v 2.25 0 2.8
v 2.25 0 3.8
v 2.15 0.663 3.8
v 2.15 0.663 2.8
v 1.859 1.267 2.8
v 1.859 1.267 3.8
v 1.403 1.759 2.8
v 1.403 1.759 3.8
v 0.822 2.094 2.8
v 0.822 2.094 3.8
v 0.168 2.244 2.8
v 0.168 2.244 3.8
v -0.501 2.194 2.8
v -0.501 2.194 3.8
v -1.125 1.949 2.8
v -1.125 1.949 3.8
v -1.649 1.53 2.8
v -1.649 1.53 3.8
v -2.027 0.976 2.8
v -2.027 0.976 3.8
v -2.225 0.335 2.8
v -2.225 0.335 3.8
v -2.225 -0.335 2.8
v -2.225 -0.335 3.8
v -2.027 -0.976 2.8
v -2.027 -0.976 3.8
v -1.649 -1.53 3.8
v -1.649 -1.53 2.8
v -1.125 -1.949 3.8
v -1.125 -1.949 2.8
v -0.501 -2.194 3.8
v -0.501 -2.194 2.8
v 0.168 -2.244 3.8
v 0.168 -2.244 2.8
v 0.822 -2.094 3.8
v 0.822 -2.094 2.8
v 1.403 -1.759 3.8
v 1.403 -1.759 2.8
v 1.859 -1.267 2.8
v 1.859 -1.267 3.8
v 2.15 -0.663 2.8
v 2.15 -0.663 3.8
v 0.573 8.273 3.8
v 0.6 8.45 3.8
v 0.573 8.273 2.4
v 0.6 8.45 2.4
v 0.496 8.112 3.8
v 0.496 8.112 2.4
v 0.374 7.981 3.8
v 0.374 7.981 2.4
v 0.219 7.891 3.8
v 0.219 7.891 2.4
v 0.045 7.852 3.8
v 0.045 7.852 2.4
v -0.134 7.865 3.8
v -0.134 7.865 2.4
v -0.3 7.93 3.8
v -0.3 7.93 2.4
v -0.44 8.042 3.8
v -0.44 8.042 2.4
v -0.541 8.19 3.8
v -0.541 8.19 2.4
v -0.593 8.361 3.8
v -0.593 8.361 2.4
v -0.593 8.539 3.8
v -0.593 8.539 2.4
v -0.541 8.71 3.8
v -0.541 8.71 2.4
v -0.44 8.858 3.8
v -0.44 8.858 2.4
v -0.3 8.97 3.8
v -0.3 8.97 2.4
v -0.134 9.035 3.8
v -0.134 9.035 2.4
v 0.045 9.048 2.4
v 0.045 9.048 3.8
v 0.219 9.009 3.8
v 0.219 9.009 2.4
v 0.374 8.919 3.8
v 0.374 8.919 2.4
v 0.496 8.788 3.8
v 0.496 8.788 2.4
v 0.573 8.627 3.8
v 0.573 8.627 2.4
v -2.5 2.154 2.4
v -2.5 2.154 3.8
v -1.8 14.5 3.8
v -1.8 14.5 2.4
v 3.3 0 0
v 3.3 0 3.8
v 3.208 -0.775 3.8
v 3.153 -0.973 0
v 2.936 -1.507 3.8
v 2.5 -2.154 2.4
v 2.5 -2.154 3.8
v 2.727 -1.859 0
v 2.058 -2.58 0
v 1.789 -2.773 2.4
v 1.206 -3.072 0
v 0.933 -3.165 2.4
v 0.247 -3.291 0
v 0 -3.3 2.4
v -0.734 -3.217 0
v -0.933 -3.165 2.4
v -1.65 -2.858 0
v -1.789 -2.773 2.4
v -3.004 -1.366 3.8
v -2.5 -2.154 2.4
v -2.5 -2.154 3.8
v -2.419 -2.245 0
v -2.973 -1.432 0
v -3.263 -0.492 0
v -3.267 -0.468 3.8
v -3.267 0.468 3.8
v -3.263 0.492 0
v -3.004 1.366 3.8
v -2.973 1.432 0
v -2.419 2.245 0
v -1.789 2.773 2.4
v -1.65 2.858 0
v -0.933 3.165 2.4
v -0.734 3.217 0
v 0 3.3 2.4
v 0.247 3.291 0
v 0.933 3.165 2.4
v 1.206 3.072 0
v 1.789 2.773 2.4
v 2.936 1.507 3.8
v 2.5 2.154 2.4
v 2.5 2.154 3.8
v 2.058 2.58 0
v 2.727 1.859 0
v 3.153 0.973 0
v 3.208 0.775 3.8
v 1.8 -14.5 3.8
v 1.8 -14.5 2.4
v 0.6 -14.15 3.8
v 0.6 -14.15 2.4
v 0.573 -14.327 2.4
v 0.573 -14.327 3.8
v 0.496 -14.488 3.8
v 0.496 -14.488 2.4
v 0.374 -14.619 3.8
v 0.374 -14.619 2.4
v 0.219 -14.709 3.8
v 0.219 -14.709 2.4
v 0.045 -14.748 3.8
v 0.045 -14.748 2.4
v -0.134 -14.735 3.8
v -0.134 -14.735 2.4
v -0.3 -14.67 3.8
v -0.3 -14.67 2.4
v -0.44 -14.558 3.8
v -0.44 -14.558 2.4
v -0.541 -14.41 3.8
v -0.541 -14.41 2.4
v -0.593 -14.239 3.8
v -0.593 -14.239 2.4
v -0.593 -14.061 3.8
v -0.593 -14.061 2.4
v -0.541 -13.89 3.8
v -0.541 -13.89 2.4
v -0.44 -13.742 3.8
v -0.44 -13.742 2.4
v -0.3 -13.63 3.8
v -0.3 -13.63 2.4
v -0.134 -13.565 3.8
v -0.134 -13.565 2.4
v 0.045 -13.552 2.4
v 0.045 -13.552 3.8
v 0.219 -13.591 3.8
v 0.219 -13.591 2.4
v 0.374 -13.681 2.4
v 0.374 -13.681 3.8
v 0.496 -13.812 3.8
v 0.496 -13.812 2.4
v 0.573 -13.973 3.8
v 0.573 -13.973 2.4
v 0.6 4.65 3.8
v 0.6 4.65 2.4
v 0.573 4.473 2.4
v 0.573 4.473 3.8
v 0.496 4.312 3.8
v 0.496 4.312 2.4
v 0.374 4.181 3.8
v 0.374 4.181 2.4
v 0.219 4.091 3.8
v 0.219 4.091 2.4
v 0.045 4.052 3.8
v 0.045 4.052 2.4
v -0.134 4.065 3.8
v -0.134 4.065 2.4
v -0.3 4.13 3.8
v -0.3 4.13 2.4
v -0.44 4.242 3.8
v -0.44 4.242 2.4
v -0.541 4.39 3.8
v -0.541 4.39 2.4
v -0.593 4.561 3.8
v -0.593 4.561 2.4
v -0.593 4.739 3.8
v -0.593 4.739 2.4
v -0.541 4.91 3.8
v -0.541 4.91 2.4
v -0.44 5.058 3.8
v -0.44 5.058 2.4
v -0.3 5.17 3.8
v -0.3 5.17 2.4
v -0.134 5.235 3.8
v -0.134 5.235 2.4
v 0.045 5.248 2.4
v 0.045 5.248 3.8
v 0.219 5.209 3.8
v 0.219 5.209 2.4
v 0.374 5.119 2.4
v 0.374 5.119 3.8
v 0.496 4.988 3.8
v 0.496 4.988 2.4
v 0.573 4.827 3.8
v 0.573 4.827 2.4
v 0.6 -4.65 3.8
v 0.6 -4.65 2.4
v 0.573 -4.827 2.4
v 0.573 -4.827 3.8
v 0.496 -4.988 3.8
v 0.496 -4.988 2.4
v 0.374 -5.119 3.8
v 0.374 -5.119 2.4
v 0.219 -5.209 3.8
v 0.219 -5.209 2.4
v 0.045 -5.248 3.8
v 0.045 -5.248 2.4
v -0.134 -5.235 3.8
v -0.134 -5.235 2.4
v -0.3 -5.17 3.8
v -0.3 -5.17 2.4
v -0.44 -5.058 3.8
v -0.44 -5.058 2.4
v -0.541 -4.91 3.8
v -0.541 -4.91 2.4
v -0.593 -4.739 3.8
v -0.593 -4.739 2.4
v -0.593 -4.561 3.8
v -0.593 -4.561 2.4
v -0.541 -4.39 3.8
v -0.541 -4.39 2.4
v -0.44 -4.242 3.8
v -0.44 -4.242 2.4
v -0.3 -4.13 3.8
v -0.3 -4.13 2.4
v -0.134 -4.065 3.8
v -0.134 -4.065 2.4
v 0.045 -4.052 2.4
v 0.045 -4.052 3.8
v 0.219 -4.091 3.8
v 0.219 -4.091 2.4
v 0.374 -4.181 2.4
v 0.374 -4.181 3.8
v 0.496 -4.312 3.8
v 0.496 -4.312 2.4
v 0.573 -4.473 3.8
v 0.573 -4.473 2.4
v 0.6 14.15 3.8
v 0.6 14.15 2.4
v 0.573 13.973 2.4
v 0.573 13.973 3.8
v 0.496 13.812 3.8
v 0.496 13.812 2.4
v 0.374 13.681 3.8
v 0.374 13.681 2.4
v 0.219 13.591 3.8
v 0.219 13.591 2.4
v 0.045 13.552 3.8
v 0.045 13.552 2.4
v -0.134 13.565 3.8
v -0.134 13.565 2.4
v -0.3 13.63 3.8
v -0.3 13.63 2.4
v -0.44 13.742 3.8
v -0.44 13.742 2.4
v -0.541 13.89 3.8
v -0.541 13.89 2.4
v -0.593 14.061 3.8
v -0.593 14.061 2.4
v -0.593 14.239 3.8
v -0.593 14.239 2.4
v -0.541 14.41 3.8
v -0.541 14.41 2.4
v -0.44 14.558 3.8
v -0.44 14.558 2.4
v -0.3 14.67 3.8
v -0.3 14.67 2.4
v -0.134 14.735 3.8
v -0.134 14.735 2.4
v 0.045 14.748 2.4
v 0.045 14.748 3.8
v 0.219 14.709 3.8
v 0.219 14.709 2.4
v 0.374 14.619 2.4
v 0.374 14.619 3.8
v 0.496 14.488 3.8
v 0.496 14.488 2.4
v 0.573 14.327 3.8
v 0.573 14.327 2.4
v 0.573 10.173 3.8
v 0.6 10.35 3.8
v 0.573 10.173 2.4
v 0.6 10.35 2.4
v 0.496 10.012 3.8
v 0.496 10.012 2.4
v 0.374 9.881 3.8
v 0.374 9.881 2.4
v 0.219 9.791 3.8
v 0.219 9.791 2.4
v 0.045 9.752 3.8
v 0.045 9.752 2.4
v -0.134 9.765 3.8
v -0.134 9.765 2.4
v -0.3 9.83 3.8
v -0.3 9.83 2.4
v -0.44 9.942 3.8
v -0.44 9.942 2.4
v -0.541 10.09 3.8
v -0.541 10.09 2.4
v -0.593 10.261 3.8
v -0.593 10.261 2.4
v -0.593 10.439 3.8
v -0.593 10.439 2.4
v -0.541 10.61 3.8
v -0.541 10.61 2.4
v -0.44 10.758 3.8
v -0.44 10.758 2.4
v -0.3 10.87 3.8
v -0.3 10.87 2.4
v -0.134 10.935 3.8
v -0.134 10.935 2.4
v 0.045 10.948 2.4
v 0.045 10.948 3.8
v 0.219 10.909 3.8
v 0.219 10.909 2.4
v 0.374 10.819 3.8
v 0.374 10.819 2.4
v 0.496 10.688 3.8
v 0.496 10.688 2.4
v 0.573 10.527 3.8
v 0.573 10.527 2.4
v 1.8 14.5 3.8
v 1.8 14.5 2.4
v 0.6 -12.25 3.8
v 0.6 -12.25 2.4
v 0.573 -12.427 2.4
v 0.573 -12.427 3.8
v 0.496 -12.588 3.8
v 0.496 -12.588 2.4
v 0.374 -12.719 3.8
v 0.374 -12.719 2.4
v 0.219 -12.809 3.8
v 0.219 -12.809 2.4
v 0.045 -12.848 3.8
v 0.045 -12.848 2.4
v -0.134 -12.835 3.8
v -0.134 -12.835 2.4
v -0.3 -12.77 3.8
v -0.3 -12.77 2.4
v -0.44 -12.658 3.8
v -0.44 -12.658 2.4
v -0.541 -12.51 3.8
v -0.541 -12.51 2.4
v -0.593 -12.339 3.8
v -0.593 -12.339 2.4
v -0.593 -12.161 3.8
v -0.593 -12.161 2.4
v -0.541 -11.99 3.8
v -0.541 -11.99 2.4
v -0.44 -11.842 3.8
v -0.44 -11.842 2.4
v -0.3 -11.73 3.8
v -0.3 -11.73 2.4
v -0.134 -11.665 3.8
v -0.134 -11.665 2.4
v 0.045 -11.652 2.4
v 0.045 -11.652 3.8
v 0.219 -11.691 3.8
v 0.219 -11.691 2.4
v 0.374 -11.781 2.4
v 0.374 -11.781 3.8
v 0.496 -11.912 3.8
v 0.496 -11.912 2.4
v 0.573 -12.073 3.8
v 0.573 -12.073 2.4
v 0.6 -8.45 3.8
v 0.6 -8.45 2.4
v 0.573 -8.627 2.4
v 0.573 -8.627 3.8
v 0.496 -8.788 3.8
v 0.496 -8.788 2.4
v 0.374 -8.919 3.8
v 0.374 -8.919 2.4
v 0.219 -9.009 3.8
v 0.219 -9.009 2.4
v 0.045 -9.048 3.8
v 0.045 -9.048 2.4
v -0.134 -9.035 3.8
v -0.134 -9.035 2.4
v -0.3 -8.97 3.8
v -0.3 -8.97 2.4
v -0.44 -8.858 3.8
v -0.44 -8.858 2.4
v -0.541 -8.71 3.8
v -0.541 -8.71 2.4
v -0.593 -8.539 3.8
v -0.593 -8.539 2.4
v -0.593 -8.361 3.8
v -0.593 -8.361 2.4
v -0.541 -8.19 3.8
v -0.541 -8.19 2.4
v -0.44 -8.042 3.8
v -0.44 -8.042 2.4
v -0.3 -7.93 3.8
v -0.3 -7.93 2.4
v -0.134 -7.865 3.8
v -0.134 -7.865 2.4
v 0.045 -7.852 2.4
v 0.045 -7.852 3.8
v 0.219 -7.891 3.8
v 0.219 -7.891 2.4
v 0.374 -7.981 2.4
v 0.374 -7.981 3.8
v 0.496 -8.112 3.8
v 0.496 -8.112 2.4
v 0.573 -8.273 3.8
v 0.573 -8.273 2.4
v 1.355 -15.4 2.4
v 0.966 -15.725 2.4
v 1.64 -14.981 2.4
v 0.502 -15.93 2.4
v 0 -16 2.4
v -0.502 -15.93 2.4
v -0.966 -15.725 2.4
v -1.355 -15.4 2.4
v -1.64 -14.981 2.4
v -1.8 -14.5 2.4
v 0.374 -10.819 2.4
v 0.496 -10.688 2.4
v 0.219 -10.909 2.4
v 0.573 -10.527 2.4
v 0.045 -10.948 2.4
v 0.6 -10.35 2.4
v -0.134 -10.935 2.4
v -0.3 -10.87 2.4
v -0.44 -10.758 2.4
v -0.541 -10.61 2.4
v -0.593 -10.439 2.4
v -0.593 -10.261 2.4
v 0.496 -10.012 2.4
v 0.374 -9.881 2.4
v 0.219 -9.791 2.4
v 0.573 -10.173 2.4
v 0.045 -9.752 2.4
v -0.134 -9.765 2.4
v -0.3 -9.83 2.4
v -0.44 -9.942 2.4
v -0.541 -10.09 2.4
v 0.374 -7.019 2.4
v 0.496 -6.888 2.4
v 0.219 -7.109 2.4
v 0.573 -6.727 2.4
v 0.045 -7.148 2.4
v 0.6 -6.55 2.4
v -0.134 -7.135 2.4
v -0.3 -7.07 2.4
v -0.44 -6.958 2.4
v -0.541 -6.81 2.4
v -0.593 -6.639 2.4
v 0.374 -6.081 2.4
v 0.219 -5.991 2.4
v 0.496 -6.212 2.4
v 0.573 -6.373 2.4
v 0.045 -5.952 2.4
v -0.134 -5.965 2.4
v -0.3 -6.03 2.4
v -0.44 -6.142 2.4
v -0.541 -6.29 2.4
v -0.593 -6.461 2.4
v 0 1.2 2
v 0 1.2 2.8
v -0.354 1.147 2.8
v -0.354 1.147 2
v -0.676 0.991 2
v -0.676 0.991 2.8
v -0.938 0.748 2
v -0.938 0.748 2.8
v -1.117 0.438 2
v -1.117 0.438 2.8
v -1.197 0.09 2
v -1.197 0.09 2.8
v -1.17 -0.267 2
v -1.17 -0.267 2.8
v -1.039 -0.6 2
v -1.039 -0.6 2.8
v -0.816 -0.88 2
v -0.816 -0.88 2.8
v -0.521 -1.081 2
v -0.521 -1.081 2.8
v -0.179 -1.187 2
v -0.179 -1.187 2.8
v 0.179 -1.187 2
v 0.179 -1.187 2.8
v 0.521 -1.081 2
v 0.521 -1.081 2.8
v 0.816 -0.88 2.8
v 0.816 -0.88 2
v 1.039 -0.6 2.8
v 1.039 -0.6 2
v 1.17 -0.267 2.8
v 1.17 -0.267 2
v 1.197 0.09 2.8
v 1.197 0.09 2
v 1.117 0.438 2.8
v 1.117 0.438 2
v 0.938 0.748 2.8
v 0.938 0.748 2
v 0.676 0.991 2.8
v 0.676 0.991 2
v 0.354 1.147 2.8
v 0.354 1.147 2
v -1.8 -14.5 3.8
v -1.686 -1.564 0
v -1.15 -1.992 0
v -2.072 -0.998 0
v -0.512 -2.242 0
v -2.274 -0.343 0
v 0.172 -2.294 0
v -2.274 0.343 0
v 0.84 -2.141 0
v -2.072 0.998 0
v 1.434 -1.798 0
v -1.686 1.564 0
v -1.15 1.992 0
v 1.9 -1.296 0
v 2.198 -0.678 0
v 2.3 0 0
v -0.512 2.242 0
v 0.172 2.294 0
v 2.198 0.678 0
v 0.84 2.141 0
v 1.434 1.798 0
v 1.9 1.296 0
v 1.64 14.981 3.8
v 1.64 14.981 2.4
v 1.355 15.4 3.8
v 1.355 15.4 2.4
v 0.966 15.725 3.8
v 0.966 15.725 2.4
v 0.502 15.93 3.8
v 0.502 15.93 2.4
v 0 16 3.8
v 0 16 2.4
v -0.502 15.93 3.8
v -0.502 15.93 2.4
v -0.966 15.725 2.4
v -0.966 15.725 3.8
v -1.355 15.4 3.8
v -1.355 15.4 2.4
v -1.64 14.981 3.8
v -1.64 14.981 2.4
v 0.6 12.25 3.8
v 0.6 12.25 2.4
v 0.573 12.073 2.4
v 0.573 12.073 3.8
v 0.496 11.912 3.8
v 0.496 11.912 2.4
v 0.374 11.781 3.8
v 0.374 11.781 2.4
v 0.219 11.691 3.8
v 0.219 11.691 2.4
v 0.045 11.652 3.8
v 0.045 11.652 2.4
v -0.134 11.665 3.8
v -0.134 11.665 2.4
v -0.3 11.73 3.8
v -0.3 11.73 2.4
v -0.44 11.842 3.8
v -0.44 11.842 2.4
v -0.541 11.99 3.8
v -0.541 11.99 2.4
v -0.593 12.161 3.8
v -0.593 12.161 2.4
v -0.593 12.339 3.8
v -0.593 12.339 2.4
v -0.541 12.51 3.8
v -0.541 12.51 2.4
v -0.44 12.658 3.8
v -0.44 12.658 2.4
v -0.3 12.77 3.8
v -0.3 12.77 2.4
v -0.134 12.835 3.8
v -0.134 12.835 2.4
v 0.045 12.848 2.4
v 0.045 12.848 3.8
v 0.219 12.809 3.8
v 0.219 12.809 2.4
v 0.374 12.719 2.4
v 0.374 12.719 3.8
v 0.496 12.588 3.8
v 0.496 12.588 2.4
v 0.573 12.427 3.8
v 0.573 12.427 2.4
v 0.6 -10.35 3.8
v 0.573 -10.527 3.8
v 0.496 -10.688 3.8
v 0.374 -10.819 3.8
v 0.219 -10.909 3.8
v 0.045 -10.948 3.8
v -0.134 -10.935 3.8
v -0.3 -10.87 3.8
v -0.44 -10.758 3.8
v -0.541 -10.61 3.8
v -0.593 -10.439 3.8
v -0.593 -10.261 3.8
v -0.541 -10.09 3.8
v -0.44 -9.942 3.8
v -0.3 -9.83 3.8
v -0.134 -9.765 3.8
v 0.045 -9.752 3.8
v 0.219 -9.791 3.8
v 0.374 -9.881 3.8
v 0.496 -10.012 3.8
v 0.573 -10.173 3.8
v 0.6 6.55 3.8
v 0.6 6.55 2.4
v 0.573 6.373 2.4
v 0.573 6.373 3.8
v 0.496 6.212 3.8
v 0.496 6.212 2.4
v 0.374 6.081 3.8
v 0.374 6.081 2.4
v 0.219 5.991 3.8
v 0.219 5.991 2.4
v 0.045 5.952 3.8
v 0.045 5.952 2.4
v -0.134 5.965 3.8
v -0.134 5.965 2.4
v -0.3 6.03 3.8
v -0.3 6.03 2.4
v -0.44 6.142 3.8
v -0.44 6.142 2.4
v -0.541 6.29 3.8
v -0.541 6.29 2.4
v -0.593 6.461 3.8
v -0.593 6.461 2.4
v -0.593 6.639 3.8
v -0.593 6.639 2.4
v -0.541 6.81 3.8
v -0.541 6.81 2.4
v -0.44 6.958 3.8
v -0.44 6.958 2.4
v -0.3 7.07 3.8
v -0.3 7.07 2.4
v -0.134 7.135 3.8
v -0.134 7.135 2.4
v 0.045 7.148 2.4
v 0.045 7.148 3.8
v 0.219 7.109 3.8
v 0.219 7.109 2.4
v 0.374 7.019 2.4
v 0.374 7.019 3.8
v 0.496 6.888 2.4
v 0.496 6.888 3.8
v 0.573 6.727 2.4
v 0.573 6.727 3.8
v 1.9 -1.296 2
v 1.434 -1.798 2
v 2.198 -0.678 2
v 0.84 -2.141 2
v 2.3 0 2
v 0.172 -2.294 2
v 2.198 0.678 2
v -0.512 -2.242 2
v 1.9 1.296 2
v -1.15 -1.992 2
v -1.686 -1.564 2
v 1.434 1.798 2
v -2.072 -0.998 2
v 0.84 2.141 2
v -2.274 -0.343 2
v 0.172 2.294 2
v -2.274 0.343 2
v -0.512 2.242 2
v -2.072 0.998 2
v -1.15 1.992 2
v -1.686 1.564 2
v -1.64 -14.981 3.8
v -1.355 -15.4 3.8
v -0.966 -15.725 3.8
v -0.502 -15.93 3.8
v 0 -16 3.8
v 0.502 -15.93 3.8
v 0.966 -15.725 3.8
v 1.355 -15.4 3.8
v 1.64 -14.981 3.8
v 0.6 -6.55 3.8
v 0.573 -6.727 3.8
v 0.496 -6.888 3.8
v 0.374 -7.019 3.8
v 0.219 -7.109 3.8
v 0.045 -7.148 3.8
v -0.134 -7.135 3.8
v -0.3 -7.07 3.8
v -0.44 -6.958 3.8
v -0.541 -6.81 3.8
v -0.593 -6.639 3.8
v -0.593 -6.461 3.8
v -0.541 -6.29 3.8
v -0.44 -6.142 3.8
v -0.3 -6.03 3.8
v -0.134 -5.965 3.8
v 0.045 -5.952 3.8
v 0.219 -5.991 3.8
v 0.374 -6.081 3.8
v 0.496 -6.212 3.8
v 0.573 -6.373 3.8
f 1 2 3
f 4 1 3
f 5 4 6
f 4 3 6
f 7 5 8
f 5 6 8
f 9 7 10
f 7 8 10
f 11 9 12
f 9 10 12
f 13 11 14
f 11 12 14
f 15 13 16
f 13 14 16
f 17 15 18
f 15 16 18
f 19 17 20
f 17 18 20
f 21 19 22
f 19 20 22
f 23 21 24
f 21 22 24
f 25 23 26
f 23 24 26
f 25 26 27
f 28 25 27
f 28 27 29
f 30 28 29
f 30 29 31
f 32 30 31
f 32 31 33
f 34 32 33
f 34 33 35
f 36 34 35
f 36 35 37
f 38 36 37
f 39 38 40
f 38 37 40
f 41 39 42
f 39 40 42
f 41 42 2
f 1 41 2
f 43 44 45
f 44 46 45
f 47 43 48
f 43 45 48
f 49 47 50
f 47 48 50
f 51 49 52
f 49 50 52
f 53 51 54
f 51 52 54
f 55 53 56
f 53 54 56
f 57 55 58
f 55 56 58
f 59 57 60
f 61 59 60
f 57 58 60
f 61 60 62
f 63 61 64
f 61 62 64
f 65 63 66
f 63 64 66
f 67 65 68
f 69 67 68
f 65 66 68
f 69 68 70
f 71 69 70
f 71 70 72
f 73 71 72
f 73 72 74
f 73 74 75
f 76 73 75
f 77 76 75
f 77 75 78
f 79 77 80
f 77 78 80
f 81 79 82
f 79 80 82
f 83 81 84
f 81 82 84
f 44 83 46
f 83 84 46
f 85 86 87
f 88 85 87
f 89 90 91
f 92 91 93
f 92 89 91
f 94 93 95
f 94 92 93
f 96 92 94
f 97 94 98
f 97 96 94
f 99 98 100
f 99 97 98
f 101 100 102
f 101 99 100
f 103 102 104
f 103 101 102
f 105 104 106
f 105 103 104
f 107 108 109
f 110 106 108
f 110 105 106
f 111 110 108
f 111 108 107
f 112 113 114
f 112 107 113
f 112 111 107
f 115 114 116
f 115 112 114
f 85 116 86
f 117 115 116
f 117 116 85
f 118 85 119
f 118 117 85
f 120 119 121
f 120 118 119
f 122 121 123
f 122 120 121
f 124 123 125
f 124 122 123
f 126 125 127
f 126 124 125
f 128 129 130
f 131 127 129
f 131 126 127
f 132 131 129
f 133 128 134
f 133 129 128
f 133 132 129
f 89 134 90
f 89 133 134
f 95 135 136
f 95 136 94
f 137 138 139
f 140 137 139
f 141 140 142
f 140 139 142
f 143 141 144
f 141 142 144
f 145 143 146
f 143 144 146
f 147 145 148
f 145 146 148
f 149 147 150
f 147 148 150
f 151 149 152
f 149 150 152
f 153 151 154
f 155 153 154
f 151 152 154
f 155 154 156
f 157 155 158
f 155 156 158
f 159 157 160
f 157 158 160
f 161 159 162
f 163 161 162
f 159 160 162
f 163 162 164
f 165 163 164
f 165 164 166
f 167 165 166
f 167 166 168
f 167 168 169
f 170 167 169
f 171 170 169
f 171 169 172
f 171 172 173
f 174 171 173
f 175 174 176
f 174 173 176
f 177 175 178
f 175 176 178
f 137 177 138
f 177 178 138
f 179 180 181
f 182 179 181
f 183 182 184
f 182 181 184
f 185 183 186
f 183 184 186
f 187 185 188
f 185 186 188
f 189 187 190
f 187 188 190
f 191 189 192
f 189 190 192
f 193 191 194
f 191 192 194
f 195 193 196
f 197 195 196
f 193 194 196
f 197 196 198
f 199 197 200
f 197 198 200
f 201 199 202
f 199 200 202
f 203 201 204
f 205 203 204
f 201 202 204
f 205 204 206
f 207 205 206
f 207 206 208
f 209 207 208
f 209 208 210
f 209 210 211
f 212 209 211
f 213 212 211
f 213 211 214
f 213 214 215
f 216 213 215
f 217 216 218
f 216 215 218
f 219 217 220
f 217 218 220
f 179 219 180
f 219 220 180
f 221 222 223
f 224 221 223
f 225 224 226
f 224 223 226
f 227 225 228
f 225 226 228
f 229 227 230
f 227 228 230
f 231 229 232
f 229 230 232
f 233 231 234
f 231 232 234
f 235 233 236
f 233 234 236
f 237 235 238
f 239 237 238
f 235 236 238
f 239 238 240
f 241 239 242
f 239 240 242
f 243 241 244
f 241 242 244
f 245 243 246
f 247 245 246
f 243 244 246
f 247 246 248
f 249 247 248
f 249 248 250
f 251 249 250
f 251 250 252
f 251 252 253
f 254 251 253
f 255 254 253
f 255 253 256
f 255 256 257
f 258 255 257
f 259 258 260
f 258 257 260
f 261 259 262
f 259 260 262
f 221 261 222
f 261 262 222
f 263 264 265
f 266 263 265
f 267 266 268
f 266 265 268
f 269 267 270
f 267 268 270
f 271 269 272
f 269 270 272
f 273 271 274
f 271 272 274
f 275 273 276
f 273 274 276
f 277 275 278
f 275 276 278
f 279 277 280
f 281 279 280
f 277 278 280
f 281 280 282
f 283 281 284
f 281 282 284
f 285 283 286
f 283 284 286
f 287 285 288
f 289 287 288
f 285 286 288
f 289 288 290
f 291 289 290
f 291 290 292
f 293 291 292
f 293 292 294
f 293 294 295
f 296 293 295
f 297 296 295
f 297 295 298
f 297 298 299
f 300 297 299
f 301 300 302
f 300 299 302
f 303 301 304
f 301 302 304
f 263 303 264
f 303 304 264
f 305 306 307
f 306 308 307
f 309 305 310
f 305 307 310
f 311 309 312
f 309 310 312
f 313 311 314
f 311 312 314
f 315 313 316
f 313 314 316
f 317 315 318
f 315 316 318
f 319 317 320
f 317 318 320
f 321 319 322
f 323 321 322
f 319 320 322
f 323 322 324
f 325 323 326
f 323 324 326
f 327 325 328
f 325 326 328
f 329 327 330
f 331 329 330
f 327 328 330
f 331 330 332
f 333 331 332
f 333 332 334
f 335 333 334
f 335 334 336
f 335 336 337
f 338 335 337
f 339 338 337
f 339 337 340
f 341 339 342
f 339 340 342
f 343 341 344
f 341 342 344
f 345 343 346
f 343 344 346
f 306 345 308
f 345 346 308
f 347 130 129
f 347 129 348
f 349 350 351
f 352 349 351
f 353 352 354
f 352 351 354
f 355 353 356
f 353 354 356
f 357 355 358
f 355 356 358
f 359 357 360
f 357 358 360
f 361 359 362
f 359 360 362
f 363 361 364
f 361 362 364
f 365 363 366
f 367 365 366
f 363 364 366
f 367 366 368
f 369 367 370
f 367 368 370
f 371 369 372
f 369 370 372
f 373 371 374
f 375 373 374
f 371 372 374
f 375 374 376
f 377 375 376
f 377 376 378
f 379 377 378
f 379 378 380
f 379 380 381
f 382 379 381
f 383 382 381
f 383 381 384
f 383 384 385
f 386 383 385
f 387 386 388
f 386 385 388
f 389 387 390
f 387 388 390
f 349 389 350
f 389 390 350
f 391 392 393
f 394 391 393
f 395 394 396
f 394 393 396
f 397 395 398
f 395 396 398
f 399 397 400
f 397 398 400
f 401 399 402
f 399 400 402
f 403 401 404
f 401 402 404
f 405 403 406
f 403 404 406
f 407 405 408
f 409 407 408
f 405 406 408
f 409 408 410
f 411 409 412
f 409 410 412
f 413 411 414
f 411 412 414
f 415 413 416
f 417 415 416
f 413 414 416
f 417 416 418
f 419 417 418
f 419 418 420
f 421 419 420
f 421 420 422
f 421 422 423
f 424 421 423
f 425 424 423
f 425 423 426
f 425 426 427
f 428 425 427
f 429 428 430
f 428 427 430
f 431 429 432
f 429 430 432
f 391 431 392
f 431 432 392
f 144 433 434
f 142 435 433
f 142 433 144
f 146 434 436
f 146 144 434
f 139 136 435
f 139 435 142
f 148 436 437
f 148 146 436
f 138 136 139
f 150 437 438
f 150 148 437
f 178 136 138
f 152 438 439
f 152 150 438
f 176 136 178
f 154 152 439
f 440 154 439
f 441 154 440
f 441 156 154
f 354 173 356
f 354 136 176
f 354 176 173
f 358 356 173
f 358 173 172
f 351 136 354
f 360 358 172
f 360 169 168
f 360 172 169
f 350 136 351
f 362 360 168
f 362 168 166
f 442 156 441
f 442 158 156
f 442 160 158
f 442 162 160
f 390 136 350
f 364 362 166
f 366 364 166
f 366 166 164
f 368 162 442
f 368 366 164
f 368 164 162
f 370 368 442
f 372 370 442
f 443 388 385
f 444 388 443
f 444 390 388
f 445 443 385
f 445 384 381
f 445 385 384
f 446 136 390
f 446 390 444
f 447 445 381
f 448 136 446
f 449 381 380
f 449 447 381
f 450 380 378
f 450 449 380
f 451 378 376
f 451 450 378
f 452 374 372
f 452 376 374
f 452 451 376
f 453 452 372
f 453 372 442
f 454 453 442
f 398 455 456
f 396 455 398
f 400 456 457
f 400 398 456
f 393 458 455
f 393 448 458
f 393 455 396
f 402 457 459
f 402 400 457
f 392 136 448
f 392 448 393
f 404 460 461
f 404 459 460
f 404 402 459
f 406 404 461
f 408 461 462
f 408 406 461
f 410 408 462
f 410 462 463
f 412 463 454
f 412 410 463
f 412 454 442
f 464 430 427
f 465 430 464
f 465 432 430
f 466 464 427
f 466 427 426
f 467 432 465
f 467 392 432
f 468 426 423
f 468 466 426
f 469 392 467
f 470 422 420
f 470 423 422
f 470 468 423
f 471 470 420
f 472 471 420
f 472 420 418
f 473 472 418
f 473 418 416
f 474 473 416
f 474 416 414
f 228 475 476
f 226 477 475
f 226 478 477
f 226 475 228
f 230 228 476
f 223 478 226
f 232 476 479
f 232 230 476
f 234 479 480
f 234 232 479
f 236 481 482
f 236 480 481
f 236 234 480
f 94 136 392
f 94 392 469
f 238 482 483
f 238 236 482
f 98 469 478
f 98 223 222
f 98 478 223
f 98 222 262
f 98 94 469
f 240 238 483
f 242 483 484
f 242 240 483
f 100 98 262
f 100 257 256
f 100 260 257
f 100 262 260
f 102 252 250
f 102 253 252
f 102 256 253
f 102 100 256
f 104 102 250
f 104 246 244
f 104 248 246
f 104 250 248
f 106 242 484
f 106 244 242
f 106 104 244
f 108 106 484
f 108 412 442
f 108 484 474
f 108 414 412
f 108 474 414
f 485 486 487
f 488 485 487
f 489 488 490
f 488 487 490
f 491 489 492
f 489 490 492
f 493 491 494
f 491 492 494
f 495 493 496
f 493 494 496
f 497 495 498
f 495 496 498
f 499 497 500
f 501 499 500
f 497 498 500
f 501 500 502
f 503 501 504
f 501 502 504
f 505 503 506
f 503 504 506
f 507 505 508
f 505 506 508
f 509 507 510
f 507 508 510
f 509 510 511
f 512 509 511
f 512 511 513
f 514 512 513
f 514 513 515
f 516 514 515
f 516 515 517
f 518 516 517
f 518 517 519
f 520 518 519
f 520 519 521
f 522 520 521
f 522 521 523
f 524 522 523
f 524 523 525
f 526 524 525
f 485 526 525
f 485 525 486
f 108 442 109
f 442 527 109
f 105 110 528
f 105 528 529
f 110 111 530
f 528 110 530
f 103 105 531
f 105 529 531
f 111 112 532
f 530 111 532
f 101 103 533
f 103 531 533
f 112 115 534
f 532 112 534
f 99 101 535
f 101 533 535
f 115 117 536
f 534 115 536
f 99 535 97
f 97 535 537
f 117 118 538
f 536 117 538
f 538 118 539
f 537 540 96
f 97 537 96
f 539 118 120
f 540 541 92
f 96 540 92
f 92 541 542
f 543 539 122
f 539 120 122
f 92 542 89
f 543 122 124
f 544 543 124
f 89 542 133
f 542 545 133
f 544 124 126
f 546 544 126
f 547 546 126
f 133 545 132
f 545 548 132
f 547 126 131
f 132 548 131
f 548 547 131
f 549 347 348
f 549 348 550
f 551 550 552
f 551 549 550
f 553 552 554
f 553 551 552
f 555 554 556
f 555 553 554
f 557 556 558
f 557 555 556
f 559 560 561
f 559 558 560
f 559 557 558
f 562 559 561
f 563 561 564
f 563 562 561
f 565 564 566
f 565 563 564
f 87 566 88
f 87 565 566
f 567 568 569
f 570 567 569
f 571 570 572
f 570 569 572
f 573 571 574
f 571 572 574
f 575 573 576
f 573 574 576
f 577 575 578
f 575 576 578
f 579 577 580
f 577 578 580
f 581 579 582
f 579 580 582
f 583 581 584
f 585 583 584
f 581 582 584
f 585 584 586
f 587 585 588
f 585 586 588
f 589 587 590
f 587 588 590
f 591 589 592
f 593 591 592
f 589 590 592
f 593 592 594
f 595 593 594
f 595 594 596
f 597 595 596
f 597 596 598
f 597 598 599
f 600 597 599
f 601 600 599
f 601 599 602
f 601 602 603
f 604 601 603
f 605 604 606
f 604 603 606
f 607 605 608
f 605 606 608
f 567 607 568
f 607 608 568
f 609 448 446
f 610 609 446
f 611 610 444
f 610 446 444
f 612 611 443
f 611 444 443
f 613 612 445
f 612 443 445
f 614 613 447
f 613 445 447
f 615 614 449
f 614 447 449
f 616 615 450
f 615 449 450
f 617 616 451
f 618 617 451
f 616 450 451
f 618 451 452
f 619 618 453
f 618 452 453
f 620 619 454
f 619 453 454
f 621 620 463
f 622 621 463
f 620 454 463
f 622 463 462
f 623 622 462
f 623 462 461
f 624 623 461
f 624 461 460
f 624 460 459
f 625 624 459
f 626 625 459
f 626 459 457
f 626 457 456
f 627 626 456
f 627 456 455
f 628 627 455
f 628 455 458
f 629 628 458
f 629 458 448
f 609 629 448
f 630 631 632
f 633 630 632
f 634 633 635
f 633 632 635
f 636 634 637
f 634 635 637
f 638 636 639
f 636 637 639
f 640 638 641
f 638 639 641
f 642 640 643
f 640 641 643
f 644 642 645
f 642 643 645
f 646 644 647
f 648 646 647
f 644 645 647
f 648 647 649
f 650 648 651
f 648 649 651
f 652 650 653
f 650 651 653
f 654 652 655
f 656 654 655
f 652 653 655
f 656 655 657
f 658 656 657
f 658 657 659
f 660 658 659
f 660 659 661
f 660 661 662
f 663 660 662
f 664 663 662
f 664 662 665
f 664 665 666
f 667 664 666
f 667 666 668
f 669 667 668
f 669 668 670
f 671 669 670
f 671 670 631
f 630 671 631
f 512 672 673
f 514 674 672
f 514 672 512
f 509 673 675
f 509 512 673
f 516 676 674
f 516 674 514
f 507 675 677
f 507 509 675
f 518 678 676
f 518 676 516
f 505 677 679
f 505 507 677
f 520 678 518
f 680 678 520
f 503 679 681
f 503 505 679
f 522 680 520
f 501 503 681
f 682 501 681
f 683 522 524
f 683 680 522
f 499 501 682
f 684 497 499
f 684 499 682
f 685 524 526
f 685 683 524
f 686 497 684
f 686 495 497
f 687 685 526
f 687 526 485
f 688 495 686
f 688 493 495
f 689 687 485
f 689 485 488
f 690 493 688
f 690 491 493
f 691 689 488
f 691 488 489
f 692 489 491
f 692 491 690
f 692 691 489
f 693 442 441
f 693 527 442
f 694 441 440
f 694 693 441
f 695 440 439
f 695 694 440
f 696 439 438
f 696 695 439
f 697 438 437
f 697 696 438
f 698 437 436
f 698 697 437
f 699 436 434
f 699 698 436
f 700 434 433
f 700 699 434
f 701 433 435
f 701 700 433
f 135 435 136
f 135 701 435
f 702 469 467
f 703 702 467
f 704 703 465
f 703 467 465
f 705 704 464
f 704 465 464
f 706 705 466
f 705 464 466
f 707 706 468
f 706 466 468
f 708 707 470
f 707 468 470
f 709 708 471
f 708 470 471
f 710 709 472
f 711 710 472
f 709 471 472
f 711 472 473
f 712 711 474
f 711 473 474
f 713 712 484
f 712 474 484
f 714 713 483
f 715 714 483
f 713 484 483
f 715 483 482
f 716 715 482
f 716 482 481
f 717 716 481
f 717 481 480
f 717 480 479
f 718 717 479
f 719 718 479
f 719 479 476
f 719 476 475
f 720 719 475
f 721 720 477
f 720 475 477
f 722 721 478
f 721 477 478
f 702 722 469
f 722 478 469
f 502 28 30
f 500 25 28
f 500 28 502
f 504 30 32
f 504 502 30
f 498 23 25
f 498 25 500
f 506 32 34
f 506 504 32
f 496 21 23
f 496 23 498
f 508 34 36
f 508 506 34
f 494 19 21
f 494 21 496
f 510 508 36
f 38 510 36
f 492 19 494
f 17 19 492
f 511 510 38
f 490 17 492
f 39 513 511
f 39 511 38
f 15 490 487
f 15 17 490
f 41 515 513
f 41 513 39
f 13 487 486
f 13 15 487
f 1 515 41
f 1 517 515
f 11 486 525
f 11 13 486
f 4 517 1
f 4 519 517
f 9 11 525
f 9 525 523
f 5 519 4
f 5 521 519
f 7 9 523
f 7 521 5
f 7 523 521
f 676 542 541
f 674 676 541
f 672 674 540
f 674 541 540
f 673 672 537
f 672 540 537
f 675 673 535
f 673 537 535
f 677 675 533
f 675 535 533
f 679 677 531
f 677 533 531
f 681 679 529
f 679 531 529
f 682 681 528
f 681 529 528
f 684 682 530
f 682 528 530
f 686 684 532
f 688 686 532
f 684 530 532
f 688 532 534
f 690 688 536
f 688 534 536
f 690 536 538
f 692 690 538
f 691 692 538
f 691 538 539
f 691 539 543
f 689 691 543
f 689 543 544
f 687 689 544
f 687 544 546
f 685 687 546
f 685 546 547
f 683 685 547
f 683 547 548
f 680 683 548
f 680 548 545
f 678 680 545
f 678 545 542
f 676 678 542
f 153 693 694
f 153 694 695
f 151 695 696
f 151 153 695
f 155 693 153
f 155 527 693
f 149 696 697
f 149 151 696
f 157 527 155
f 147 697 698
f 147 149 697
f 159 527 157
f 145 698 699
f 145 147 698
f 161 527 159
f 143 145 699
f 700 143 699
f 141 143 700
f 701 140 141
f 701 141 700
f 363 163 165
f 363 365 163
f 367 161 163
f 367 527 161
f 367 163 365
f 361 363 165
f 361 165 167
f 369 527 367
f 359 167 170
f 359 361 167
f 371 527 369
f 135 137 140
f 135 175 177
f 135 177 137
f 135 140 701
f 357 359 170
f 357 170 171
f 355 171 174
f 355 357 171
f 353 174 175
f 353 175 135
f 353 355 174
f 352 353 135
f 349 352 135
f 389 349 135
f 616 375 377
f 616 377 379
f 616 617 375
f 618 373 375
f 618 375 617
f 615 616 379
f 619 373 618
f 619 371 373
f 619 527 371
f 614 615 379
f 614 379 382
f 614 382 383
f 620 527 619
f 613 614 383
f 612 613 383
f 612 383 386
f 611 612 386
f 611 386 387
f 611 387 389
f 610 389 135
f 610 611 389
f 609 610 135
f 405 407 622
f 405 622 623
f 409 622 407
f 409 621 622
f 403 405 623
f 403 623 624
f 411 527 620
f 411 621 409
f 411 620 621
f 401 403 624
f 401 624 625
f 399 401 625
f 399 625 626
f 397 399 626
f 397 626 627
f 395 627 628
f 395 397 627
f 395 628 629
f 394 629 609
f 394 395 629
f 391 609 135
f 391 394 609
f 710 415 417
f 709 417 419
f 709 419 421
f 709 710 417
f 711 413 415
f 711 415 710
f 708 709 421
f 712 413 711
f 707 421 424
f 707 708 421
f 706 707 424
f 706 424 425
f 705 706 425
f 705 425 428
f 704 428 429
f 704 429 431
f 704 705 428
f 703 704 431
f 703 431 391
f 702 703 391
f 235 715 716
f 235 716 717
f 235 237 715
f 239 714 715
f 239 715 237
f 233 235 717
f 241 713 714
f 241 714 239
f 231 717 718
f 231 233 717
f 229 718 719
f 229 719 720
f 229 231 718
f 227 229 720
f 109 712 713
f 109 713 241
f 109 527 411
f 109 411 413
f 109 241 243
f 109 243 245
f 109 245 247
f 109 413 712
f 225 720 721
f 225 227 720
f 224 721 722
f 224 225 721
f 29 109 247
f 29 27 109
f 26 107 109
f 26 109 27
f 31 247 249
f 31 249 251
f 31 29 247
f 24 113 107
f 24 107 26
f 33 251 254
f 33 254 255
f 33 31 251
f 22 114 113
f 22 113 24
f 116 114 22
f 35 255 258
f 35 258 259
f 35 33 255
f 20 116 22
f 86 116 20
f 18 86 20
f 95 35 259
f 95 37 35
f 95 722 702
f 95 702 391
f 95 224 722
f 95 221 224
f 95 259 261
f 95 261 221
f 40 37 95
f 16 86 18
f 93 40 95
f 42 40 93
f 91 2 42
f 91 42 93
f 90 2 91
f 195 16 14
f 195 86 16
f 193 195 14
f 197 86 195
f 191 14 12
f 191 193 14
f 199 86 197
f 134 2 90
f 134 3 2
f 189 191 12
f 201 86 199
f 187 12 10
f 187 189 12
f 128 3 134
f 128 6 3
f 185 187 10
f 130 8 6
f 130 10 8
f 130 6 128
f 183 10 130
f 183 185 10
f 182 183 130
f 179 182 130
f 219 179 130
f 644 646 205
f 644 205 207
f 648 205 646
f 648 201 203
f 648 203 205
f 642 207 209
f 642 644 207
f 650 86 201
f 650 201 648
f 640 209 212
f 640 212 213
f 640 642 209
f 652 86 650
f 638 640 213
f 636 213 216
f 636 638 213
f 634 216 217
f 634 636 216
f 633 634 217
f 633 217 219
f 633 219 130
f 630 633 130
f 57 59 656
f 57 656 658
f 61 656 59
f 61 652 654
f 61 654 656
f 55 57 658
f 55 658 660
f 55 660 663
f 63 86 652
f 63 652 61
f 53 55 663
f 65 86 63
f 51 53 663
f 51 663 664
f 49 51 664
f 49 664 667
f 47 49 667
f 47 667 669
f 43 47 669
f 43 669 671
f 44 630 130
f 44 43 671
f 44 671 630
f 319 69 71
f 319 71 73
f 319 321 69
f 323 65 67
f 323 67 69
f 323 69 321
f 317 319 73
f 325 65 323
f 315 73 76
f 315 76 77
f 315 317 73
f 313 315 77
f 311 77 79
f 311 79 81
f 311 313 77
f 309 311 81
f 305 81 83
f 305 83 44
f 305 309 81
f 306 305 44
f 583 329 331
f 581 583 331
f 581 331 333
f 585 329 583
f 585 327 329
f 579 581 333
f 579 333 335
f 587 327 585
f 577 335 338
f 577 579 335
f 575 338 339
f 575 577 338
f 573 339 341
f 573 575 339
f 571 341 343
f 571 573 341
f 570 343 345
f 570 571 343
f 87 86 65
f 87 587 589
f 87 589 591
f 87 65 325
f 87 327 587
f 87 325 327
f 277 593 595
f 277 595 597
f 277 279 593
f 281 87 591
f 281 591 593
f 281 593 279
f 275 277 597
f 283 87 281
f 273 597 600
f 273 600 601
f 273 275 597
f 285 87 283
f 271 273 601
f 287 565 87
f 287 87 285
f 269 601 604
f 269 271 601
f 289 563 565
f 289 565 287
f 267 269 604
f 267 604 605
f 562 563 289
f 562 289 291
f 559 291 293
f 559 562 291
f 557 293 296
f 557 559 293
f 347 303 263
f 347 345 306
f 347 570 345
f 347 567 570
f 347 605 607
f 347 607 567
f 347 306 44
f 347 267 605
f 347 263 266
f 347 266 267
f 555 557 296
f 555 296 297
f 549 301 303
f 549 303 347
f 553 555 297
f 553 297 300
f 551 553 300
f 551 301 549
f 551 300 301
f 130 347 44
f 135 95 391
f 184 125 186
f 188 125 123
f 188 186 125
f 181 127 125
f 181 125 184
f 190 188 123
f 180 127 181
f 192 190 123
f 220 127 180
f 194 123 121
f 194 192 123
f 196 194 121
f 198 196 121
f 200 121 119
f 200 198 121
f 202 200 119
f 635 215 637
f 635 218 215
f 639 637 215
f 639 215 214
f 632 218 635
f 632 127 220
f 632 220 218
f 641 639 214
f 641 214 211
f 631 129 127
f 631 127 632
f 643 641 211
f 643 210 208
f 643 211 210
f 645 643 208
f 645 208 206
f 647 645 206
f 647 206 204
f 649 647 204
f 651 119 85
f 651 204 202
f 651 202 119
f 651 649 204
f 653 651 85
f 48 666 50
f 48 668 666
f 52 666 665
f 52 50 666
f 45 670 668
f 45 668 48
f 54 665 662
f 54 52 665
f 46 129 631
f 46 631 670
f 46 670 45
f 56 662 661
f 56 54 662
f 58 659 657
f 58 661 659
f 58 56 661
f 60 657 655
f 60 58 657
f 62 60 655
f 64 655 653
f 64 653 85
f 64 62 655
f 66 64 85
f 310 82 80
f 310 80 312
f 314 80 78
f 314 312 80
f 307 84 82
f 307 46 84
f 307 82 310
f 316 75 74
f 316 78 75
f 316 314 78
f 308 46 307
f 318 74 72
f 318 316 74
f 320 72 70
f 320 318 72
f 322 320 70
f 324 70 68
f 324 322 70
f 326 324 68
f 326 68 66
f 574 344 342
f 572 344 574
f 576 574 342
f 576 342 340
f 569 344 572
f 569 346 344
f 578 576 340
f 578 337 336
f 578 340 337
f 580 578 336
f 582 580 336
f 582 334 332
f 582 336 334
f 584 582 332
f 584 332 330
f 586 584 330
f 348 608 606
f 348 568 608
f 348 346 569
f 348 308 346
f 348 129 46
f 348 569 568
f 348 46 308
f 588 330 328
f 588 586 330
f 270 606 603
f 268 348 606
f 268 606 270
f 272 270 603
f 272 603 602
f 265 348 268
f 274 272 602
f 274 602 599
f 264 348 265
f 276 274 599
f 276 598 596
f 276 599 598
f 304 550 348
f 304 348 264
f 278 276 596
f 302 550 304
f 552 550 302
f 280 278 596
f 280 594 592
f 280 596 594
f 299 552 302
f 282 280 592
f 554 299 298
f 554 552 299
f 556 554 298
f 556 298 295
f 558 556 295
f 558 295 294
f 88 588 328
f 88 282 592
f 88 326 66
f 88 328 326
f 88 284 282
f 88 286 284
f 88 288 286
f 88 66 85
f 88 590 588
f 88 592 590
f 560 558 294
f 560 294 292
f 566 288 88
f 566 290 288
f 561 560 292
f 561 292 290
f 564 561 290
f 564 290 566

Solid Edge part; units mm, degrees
sketch "Sketch1" plane through (0, 0, 0) normal (0, 0, 1) x (1, 0, 0)
  circle A0 centre (0, 0) radius 3.3
  dimension "D1" = 6.6
extrude "Protrusion1" add sketch "Sketch1" along normal blind 3.8
sketch "Sketch2" plane through (0, 0, 3.8) normal (0, 0, 1) x (1, 0, 0)
  circle A0 centre (0, 0) radius 2.25
  dimension "D1" = 4.5
extrude "Extrusionsausschnitt_1" cut sketch "Sketch2" against normal blind 1
sketch "Sketch3" plane through (0, 0, 0) normal (0, 0, -1) x (1, 0, 0)
  circle A0 centre (0, 0) radius 2.3
  dimension "D1" = 4.6
extrude "Extrusionsausschnitt_2" cut sketch "Sketch3" against normal blind 2
sketch "Sketch4" plane through (0, 0, 2.8) normal (0, 0, 1) x (0, 1, 0)
  circle A0 centre (0, 0) radius 1.2
  dimension "D1" = 2.4
extrude "Cutout1" cut sketch "Sketch4" against normal through all
sketch "Sketch5" plane through (0, 0, 3.8) normal (0, 0, 1) x (0, 1, 0)
  line L0 (-14.5, 1.8) -> (-2.1541, 2.5)
  arc A0 (-2.1541, 2.5) -> (-2.1541, -2.5) centre (0, 0) ccw
  line L1 (-14.5, -1.8) -> (-2.1541, -2.5)
  arc A1 (-14.5, 1.8) -> (-14.5, -1.8) centre (-14.17, 0) ccw
  line L2 (2.1541, 2.5) -> (14.5, 1.8)
  arc A2 (14.5, 1.8) -> (14.5, -1.8) centre (14.17, 0) cw
  line L3 (2.1541, -2.5) -> (14.5, -1.8)
  arc A3 (2.1541, 2.5) -> (2.1541, -2.5) centre (0, 0) cw
  dimension "D1" = 5
  dimension "D2" = 32
  dimension "D3" = 3.6
  dimension "D4" = 3.6
  dimension "D5" = 29
  dimension "D6" = 4.3081
  dimension "D7" = 4.3081
  dimension "D8" = 12.3658
  dimension "D9" = 12.3658
  dimension "D10" = 12.3658
  dimension "D11" = 12.3658
extrude "Extrusionsausprägung_2" add sketch "Sketch5" against normal blind 1.4
sketch "Sketch6" plane through (0, 0, 0) normal (0, 0, 1) x (1, 0, 0)
  circle A0 centre (0, -14.15) radius 0.6
  circle A1 centre (0, -12.25) radius 0.6
  circle A2 centre (0, -10.35) radius 0.6
  circle A3 centre (0, -8.45) radius 0.6
  circle A4 centre (0, -6.55) radius 0.6
  circle A5 centre (0, -4.65) radius 0.6
  dimension "D1" = 1.2
  dimension "D2" = 6.9
  dimension "D3" = 3.8
extrude "Cutout2" cut sketch "Sketch6" along normal through all
mirror "Mirror1" about plane through (0, 0, 0) normal (0, -1, 0) of "Cutout2"
